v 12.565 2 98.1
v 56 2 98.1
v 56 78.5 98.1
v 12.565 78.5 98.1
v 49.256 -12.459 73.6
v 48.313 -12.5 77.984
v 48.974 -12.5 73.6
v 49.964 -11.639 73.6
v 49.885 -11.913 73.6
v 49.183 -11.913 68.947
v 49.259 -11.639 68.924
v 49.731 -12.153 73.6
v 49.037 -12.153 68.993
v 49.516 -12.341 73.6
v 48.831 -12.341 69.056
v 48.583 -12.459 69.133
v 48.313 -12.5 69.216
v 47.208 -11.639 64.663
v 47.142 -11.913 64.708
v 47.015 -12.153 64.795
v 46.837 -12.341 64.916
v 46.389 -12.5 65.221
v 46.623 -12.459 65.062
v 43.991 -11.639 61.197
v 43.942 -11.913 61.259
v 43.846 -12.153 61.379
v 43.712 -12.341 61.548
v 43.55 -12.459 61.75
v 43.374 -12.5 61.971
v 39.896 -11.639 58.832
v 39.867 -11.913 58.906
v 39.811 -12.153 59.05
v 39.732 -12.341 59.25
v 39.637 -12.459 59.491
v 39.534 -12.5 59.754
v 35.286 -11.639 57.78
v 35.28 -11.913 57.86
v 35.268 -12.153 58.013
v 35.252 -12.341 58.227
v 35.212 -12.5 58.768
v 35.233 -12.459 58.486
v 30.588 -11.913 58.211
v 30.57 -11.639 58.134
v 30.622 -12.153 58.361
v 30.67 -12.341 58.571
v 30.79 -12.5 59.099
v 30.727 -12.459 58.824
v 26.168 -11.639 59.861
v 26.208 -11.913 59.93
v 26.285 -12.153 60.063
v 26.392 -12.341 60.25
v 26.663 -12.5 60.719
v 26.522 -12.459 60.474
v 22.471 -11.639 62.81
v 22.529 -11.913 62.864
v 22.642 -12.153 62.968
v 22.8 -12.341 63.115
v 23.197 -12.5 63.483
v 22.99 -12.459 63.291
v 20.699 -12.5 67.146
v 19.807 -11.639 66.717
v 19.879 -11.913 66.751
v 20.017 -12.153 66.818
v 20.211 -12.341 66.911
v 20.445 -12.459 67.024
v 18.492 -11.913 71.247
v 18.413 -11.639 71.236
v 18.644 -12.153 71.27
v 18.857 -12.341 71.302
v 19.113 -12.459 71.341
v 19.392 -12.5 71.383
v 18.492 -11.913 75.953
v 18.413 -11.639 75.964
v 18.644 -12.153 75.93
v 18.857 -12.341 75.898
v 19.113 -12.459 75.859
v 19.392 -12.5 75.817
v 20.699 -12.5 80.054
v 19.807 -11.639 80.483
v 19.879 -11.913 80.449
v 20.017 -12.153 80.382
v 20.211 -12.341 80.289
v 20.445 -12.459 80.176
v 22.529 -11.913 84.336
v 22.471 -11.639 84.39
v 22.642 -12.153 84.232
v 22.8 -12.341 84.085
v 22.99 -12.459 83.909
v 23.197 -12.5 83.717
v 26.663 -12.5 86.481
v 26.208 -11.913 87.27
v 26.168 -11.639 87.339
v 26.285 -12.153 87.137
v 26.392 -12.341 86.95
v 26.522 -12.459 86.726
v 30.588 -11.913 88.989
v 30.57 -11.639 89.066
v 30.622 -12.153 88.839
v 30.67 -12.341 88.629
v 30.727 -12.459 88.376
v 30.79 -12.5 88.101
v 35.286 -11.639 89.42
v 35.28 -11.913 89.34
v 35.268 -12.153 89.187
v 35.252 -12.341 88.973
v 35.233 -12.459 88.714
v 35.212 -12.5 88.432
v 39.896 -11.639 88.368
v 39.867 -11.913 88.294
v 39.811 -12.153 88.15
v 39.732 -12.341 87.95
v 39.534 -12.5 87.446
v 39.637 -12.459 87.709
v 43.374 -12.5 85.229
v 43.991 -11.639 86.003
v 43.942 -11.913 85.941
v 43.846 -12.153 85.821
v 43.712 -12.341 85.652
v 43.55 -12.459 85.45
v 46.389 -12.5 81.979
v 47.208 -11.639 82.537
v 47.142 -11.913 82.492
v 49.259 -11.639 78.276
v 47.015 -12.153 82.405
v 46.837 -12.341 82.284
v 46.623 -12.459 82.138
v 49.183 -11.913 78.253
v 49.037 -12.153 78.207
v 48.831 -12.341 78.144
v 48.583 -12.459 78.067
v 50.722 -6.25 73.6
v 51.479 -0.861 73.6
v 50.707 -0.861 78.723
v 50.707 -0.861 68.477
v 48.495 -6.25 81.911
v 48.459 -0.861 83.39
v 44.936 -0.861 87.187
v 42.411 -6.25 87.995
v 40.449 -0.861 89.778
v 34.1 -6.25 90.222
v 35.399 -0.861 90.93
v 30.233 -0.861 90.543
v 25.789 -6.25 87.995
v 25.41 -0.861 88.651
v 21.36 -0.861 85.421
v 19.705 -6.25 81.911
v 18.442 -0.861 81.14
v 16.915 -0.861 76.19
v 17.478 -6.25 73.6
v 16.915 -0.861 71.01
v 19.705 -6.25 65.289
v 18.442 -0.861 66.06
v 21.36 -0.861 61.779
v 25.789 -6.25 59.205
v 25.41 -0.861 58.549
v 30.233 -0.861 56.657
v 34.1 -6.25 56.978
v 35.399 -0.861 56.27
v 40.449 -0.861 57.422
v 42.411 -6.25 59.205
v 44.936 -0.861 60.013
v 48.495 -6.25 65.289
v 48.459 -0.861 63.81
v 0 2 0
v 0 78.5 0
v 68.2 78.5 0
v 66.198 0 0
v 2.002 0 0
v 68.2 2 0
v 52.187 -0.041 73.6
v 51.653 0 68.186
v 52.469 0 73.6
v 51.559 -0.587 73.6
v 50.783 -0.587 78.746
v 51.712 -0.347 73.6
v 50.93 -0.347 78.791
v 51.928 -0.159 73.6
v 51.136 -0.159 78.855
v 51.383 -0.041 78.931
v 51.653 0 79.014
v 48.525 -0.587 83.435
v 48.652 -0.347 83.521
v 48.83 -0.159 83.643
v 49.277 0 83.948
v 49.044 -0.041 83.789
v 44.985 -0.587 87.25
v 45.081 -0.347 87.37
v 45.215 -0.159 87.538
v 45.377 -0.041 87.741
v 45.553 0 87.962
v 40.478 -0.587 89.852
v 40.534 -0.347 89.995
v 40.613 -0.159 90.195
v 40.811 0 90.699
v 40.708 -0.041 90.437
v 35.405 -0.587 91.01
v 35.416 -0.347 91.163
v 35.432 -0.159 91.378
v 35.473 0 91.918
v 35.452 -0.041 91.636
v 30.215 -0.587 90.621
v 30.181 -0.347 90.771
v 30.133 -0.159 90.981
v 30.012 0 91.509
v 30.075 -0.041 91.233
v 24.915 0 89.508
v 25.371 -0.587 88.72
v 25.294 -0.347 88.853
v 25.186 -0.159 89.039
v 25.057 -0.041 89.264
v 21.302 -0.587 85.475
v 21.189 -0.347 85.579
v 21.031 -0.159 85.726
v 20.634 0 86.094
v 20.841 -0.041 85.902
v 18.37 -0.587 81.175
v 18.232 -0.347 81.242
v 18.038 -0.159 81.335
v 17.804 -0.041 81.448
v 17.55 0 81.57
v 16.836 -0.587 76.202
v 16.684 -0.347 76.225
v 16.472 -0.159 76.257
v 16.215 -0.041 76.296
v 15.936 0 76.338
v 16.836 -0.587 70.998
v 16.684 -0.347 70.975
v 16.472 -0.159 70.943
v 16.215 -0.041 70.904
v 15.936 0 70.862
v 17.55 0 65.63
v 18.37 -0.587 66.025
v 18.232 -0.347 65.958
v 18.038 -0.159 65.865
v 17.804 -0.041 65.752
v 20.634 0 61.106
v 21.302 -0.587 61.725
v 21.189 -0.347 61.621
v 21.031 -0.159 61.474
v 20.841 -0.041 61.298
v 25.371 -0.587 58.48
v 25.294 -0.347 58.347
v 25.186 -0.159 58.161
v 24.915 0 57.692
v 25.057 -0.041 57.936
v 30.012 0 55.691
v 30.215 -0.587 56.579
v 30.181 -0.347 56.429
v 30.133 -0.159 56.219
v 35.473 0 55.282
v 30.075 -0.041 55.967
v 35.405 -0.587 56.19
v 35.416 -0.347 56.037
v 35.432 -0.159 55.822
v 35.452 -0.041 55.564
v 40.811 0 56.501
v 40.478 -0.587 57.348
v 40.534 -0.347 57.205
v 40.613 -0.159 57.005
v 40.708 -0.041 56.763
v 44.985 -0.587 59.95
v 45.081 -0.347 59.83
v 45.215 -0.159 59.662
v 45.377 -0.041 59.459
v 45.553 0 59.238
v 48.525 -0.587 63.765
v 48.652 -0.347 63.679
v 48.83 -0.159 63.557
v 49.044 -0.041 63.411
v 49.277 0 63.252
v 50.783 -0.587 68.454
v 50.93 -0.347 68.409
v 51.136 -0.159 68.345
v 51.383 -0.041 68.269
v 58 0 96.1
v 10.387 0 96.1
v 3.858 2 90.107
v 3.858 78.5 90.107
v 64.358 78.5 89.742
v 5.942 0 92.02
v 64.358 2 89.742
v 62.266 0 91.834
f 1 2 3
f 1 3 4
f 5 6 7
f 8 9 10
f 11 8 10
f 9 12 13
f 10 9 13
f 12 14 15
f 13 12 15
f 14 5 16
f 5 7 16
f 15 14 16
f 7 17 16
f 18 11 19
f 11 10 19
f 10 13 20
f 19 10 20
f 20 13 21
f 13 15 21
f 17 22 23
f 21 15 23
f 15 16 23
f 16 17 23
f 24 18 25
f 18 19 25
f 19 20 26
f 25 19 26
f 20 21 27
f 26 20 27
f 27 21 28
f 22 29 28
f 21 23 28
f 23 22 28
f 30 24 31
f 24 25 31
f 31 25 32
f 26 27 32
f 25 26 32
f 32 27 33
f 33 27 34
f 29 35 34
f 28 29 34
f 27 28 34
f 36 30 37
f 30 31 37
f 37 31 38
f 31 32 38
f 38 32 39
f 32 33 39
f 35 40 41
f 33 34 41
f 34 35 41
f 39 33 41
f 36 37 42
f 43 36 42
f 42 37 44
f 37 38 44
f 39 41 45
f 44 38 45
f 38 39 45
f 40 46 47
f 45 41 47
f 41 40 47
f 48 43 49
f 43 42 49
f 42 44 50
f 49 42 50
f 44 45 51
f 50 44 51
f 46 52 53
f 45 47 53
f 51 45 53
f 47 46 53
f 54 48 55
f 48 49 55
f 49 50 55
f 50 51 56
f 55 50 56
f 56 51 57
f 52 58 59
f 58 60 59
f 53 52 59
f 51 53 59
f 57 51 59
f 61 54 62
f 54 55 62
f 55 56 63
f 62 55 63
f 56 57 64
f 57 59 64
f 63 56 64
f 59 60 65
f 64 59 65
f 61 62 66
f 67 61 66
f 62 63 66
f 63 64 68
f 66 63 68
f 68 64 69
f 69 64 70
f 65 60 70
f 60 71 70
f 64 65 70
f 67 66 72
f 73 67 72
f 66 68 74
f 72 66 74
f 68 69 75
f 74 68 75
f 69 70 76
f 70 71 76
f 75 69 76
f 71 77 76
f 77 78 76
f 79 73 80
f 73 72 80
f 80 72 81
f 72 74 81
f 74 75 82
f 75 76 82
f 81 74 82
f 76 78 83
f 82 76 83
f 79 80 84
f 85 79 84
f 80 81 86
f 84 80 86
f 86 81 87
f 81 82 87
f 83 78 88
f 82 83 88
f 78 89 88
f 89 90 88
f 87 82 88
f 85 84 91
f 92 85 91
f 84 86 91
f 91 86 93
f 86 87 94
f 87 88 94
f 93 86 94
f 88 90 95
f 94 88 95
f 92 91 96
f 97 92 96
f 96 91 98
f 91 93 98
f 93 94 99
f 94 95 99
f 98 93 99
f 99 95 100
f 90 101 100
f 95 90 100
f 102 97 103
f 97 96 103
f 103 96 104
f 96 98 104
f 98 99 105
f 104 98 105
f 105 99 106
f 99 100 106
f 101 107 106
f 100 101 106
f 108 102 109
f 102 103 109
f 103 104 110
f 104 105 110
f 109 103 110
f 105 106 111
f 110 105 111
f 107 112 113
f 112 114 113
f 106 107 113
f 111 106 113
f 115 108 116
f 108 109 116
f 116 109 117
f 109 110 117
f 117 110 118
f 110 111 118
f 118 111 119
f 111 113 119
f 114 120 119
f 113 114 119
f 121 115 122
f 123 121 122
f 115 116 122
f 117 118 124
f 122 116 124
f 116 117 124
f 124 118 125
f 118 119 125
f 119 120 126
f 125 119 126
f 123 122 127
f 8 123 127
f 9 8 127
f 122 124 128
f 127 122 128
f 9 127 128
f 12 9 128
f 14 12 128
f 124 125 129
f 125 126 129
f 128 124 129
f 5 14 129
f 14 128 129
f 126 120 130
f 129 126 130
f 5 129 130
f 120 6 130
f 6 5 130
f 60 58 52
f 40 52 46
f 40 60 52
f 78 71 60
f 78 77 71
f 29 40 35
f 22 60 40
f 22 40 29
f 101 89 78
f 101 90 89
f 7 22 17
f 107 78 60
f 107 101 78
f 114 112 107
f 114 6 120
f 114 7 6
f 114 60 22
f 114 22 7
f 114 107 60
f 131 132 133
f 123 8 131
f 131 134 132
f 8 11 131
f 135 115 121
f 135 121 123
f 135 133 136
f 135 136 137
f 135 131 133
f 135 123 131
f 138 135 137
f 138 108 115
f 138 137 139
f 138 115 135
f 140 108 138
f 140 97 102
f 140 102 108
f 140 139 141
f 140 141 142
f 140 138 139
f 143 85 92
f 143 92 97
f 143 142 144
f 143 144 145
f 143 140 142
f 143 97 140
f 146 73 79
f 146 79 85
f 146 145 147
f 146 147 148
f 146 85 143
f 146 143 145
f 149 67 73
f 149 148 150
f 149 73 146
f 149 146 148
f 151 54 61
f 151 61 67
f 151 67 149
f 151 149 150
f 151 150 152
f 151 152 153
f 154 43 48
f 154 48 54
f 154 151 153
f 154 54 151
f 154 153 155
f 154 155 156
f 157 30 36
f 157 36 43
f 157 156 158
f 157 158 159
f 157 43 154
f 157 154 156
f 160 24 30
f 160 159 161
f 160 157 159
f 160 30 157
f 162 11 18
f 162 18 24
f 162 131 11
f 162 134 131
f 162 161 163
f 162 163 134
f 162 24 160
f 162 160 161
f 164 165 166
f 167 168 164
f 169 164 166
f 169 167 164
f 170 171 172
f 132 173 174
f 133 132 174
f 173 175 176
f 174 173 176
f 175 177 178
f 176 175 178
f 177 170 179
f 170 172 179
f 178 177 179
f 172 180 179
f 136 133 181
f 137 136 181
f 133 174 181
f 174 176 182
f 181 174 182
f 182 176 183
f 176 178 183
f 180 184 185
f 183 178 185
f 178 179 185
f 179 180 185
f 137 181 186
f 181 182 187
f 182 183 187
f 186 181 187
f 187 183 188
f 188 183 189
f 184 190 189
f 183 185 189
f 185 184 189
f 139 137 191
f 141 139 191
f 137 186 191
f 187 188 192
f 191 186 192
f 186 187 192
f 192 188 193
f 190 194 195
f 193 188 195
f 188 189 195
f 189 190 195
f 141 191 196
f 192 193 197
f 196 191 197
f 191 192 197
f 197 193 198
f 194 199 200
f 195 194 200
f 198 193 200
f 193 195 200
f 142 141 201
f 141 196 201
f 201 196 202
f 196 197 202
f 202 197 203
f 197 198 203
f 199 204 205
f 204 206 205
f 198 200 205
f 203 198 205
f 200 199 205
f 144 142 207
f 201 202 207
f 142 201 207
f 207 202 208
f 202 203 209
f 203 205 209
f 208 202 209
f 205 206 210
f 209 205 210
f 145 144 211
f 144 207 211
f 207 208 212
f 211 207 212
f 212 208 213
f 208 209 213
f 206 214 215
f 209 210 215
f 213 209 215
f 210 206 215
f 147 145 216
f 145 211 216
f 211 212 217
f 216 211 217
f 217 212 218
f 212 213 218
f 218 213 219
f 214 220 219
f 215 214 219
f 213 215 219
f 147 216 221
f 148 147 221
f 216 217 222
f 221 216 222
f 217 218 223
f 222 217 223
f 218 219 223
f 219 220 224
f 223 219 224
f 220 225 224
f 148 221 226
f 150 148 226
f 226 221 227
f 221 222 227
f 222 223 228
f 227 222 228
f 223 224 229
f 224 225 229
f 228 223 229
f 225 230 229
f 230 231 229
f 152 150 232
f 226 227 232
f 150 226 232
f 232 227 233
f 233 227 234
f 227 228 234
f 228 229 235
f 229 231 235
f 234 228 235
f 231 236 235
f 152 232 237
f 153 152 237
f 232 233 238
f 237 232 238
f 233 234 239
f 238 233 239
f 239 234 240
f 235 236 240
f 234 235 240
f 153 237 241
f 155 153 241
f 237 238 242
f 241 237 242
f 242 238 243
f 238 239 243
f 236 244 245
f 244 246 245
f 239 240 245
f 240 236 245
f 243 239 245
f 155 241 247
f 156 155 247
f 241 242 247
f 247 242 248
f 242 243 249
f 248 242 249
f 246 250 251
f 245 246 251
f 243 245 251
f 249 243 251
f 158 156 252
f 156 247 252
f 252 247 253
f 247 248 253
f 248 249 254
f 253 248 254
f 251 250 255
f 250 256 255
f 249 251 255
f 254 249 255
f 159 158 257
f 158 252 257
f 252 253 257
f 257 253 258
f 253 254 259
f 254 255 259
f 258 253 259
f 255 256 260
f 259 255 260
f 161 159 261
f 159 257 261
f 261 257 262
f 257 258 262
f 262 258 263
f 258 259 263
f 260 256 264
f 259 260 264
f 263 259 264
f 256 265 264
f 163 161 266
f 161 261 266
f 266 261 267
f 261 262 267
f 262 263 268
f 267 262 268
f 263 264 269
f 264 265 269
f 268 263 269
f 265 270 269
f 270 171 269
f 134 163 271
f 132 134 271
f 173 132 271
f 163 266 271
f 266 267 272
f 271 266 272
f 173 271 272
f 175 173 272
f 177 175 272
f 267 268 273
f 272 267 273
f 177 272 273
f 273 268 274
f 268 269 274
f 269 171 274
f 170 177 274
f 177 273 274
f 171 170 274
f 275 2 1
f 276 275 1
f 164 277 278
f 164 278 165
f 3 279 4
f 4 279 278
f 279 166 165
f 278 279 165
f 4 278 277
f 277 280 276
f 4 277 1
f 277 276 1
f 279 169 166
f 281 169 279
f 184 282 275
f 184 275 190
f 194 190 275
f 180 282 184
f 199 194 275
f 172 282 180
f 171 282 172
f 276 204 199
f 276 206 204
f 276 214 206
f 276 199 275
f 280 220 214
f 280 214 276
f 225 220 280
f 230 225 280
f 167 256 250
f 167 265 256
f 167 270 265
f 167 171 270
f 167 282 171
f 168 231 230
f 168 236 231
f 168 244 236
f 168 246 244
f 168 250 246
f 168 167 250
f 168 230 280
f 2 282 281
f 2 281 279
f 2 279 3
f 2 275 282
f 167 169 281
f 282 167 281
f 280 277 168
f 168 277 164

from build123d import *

# Parameters (mm, degrees)
BOSS_EXTRUDE1_DEPTH = 78.5
SKETCH4_R           = 17.5
BOSS_EXTRUDE2_DEPTH = 12.5
BOSS_EXTRUDE2_TAPER = 8
FILLET1_R           = 1
FILLET2_R           = 1
CHAMFER1_SIZE       = 2
CHAMFER2_SIZE       = 8
CHAMFER2_SIZE_2     = 8.365483885


with BuildPart() as part:
    # Sketch1 → Boss-Extrude1 (new body)
    with BuildSketch(Plane(origin=(0, 0, 0), x_dir=(1, 0, 0), z_dir=(0, 1, 0))):
        Polygon((0, 0), (68.2, 0), (64, -98.1), (4.2, -98.1), align=None)
    extrude(amount=BOSS_EXTRUDE1_DEPTH)

    # Sketch4 → Boss-Extrude2 (add)
    with BuildSketch(Plane.XZ):
        with Locations((34.1, 73.6)):
            Circle(SKETCH4_R)
    extrude(amount=BOSS_EXTRUDE2_DEPTH, taper=BOSS_EXTRUDE2_TAPER)

    # Fillet1
    fillet1_edges = [part.edges().sort_by_distance(p)[0] for p in [
        (18.356760434, -12.5, 73.6),
    ]]
    fillet(fillet1_edges, radius=FILLET1_R)

    # Fillet2
    fillet2_edges = [part.edges().sort_by_distance(p)[0] for p in [
        (16.6, 0, 73.6),
    ]]
    fillet(fillet2_edges, radius=FILLET2_R)

    # Chamfer1
    chamfer1_edges = [part.edges().sort_by_distance(p)[0] for p in [
        (66.1, 0, 49.05),
        (34.1, 0, 98.1),
        (2.1, 0, 49.05),
    ]]
    chamfer(chamfer1_edges, length=CHAMFER1_SIZE)

    # Chamfer2
    # the kernel refuses this chamfer: 8.365483885, 8 mm, written as the material it takes off along each edge
    with BuildSketch(Plane(origin=(4.2, -19.537429792, 98.1), x_dir=(-0.07144532061930704, 0, -0.9974445178362575), z_dir=(0, 1, 0))) as chamfer2_piece_1:
        Polygon((CHAMFER2_SIZE * 0.999587640261, -CHAMFER2_SIZE * 0.028714968879), (-CHAMFER2_SIZE_2 * 0.071445320615, -CHAMFER2_SIZE_2 * 0.997444517777), (0, 0), align=None)
    extrude(amount=119.574859584, mode=Mode.SUBTRACT)
    with BuildSketch(Plane(origin=(64, -19.537429792, 98.1), x_dir=(0.06900069983757576, 0, -0.9976166114404496), z_dir=(0, 1, 0))) as chamfer2_piece_2:
        Polygon((CHAMFER2_SIZE_2 * 0.999655009427, CHAMFER2_SIZE_2 * 0.0262652243269), (-CHAMFER2_SIZE * 0.0690006998376, CHAMFER2_SIZE * 0.99761661144), (0, 0), align=None)
    extrude(amount=119.574859584, mode=Mode.SUBTRACT)


solid = part.part
